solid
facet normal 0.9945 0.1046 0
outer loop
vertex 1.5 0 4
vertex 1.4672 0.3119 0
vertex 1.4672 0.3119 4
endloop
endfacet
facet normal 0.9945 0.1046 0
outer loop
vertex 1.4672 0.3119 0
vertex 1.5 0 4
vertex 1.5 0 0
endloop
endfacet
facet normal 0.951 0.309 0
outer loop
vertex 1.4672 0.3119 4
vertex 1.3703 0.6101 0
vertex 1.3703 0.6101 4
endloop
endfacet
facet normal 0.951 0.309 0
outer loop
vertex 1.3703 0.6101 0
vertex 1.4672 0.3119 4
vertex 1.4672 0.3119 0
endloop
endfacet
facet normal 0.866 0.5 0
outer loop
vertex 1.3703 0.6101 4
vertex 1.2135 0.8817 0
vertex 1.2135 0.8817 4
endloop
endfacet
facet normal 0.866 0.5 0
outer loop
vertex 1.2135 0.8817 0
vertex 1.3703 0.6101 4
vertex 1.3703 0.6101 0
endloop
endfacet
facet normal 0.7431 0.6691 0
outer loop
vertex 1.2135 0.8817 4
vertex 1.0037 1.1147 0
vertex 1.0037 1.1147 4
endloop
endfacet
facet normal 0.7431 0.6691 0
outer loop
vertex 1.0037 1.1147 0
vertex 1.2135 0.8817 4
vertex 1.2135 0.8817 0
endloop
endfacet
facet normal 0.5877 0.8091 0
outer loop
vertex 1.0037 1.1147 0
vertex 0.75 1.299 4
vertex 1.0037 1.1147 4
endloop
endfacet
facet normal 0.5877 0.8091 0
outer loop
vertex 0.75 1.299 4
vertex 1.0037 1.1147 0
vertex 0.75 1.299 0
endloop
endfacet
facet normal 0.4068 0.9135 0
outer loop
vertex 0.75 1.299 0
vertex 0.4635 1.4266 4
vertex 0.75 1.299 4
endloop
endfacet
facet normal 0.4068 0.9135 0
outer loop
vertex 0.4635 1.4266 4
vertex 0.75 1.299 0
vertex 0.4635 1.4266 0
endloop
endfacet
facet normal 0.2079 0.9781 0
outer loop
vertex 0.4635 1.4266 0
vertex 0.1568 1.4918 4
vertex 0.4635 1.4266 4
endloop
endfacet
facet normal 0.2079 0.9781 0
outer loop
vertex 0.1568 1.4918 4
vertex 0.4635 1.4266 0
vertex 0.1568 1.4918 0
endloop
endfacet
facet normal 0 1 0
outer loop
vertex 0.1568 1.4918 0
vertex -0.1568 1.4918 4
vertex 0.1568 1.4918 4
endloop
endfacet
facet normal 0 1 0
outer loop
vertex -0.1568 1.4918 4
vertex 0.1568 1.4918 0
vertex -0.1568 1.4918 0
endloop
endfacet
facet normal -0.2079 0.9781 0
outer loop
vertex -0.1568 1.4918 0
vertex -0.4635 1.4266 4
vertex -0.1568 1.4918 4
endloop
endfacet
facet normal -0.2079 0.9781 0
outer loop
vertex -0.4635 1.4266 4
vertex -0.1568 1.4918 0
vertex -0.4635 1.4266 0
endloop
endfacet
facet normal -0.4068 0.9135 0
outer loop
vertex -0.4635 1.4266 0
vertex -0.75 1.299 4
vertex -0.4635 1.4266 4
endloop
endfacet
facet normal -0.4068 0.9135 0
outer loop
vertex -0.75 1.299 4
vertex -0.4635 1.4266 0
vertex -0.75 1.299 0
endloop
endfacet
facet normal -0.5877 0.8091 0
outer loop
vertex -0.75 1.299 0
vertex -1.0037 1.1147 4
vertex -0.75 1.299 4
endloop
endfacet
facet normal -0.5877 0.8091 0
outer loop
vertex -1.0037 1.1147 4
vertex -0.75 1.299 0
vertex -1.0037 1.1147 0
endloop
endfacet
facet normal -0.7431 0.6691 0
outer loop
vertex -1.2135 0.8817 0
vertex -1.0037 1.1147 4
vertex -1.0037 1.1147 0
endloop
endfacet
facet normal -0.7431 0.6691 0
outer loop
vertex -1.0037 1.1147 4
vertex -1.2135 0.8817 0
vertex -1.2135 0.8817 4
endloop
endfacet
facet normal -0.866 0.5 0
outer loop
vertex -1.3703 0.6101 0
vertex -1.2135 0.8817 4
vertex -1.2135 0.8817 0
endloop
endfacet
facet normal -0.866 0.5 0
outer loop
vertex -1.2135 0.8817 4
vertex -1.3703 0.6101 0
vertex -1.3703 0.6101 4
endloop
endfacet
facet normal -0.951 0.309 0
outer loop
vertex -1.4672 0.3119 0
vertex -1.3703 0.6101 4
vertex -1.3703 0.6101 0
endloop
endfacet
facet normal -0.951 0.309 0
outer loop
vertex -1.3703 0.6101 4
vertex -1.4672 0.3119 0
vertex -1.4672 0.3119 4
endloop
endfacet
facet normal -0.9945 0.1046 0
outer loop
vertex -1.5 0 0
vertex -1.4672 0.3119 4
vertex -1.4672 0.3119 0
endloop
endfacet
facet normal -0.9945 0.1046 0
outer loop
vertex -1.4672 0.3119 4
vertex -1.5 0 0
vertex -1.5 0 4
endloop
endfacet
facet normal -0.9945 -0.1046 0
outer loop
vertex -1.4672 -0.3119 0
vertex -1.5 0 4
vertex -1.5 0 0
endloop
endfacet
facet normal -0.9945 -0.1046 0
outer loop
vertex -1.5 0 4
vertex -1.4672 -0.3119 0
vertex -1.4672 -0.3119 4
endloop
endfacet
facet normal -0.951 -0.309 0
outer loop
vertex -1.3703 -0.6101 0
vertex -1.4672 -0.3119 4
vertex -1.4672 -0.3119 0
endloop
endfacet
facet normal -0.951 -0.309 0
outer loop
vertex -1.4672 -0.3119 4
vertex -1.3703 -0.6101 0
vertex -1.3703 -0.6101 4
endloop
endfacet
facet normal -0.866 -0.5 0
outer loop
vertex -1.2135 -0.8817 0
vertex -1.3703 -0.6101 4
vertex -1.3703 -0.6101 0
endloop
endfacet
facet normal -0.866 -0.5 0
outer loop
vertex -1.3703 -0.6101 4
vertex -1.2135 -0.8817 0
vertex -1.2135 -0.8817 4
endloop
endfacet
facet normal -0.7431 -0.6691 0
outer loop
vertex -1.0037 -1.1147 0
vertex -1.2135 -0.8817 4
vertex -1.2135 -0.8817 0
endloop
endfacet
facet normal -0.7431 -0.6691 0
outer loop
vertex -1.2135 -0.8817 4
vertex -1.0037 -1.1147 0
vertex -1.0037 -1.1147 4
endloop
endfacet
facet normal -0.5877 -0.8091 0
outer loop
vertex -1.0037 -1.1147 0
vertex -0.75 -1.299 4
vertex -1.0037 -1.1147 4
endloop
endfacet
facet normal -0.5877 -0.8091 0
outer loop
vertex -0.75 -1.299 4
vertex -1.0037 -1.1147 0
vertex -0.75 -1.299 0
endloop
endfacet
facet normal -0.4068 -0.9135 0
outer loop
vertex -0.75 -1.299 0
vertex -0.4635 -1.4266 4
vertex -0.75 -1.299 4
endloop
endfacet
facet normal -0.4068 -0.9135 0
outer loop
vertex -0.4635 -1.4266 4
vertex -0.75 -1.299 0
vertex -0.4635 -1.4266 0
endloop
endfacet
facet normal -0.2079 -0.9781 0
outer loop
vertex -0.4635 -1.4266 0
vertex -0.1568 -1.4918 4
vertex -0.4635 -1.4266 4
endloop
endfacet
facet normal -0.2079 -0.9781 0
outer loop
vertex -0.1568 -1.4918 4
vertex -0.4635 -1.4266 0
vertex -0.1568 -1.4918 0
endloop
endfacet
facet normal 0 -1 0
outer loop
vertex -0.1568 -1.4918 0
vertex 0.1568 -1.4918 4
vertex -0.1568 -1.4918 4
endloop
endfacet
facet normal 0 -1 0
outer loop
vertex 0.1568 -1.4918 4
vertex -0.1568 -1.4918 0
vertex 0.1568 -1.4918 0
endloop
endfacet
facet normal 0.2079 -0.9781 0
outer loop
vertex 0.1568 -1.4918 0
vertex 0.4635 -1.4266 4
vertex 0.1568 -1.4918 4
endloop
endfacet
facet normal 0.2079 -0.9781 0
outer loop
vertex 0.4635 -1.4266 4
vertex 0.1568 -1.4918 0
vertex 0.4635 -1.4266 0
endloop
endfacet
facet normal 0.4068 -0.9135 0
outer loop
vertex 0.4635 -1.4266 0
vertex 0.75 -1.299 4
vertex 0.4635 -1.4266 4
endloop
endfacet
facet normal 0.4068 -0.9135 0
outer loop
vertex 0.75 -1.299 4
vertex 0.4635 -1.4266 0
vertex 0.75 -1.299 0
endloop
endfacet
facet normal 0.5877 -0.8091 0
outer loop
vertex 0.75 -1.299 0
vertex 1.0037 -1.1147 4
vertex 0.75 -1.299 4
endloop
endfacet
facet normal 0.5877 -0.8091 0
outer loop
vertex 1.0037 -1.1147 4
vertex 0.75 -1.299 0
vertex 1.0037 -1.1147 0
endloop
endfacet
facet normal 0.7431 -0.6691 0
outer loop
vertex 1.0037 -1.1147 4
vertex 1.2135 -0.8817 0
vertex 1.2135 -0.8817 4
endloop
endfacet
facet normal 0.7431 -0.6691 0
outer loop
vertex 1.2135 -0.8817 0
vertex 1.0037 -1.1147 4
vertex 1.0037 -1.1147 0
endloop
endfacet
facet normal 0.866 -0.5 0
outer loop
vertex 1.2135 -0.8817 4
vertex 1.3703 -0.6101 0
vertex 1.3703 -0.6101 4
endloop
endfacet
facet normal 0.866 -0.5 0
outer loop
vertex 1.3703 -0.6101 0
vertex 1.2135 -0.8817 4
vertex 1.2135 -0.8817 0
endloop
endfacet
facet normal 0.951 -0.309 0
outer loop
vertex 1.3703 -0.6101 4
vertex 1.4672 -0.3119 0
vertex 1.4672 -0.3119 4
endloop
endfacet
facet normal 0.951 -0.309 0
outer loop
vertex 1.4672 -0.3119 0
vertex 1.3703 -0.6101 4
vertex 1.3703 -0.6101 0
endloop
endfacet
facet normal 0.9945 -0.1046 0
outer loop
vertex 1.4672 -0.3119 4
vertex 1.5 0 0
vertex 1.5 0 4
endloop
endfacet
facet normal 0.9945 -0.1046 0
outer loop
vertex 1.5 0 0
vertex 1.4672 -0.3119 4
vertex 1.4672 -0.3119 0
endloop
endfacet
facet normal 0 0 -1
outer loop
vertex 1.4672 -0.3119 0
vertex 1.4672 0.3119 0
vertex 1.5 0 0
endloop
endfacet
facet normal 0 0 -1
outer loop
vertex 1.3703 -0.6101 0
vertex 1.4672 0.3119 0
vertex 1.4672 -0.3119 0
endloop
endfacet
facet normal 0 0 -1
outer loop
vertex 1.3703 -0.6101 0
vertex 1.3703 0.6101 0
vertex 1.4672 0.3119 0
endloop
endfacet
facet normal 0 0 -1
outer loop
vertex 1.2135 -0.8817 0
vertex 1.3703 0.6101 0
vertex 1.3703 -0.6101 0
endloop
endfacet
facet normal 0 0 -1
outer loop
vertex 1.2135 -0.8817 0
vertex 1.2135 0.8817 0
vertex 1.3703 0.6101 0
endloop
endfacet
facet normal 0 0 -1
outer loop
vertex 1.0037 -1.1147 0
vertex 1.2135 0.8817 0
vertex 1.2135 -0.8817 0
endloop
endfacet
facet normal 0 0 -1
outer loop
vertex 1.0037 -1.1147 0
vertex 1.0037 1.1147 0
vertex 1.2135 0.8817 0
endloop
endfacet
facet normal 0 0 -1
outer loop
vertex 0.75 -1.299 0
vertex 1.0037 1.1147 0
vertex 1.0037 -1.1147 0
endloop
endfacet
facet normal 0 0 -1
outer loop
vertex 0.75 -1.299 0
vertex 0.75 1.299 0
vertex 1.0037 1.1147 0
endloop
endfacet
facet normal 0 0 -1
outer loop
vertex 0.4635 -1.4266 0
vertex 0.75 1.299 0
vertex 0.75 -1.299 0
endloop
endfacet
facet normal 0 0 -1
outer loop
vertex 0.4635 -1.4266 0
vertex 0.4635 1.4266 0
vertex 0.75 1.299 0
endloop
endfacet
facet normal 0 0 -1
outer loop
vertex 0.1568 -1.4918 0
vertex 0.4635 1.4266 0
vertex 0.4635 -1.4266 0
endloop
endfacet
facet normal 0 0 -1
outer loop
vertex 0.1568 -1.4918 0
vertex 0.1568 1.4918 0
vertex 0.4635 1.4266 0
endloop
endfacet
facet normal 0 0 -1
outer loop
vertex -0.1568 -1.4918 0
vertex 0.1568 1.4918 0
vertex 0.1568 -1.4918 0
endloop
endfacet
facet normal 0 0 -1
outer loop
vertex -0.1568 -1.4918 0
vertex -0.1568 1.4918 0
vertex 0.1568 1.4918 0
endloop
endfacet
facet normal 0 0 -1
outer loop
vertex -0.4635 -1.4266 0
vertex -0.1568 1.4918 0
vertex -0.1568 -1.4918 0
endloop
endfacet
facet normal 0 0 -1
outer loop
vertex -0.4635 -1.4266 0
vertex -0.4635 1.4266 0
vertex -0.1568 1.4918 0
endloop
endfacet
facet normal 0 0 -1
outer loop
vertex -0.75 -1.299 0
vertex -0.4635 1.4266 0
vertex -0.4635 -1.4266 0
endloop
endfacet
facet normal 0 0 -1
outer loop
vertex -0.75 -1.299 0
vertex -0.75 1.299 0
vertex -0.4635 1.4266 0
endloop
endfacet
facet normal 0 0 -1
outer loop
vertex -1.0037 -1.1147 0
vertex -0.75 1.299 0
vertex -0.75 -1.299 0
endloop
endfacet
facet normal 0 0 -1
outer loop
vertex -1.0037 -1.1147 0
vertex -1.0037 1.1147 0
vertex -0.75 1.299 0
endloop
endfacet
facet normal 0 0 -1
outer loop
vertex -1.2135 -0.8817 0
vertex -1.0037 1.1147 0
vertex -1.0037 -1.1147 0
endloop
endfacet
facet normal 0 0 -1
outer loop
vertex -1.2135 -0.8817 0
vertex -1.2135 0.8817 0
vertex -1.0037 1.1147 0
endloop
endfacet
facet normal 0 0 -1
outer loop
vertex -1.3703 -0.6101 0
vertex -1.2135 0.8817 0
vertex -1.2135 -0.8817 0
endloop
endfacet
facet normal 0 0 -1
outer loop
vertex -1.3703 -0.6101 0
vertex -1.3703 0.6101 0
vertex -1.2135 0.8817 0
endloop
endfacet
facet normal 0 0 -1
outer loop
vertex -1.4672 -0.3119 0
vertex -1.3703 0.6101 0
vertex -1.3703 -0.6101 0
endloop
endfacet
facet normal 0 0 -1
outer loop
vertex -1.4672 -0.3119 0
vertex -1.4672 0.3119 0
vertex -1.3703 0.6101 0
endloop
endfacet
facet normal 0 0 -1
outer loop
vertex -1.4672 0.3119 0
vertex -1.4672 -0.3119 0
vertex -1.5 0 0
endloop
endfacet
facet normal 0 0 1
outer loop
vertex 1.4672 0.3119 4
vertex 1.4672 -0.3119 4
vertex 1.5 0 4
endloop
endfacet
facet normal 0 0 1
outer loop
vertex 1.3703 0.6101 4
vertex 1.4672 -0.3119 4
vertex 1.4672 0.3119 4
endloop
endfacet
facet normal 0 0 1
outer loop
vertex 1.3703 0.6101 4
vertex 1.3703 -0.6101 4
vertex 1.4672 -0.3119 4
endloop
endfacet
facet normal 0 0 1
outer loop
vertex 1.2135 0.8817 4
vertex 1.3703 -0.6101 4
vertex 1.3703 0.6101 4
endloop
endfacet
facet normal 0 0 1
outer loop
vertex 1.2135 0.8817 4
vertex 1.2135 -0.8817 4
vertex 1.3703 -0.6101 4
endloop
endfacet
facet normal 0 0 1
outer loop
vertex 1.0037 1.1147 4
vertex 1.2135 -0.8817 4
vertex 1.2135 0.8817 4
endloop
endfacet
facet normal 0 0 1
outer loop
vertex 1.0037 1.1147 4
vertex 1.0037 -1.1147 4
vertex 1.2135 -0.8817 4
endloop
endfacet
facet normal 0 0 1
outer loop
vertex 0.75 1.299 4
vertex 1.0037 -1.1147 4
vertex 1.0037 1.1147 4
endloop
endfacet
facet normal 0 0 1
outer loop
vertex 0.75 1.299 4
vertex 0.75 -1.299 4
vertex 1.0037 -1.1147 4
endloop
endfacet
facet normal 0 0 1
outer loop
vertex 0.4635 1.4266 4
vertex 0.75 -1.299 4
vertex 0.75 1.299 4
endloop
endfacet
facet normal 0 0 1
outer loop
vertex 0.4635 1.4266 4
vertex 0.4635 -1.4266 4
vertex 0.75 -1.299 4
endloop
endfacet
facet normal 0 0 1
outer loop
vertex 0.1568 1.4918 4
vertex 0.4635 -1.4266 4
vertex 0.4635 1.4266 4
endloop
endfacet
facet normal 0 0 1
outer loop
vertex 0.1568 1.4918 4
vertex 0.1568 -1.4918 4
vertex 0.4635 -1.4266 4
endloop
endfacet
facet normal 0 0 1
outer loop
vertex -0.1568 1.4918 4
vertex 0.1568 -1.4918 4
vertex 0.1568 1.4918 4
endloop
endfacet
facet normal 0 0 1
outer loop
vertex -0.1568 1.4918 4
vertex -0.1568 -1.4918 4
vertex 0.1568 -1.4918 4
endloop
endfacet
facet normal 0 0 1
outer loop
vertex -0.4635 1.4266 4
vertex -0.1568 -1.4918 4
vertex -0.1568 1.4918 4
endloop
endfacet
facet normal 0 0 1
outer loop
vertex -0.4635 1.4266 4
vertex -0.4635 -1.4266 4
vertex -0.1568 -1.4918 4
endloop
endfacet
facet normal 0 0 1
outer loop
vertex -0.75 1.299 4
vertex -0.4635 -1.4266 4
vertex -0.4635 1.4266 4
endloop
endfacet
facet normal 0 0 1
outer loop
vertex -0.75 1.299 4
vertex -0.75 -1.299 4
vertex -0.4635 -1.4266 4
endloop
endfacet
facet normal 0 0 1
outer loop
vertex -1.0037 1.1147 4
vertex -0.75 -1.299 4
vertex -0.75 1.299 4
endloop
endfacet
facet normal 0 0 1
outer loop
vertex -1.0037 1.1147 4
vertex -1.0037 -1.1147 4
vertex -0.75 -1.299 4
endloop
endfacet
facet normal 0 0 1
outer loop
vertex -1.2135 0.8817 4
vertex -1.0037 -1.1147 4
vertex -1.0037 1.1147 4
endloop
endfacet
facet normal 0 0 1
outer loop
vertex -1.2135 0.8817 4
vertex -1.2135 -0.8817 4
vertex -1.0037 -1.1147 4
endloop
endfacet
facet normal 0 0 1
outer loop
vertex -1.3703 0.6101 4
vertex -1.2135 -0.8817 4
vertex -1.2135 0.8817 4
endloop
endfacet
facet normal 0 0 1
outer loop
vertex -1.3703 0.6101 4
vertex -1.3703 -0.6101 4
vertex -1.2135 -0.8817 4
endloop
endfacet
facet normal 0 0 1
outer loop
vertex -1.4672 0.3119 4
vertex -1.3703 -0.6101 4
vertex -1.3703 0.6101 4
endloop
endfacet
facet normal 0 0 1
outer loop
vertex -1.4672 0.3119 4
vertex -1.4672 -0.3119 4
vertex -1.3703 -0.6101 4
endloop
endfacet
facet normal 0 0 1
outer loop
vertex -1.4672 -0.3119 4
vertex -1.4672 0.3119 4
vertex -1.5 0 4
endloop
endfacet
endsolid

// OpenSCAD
// part_id: b4
// name: B4 rivet pin
// source_drawing_ids: DRW-002
// units: mm
// revision: 0.2
// SPDX-License-Identifier: MIT

module part_b4(pin_d = 3.0, pin_h = 4.0) {
    cylinder(d = pin_d, h = pin_h, center = false, $fn = 30);
}

// ---- "main guard" ----
// Default to previewing when opened directly:
if (is_undef(__LIB_MODE__)) {
    part_b4();
}
